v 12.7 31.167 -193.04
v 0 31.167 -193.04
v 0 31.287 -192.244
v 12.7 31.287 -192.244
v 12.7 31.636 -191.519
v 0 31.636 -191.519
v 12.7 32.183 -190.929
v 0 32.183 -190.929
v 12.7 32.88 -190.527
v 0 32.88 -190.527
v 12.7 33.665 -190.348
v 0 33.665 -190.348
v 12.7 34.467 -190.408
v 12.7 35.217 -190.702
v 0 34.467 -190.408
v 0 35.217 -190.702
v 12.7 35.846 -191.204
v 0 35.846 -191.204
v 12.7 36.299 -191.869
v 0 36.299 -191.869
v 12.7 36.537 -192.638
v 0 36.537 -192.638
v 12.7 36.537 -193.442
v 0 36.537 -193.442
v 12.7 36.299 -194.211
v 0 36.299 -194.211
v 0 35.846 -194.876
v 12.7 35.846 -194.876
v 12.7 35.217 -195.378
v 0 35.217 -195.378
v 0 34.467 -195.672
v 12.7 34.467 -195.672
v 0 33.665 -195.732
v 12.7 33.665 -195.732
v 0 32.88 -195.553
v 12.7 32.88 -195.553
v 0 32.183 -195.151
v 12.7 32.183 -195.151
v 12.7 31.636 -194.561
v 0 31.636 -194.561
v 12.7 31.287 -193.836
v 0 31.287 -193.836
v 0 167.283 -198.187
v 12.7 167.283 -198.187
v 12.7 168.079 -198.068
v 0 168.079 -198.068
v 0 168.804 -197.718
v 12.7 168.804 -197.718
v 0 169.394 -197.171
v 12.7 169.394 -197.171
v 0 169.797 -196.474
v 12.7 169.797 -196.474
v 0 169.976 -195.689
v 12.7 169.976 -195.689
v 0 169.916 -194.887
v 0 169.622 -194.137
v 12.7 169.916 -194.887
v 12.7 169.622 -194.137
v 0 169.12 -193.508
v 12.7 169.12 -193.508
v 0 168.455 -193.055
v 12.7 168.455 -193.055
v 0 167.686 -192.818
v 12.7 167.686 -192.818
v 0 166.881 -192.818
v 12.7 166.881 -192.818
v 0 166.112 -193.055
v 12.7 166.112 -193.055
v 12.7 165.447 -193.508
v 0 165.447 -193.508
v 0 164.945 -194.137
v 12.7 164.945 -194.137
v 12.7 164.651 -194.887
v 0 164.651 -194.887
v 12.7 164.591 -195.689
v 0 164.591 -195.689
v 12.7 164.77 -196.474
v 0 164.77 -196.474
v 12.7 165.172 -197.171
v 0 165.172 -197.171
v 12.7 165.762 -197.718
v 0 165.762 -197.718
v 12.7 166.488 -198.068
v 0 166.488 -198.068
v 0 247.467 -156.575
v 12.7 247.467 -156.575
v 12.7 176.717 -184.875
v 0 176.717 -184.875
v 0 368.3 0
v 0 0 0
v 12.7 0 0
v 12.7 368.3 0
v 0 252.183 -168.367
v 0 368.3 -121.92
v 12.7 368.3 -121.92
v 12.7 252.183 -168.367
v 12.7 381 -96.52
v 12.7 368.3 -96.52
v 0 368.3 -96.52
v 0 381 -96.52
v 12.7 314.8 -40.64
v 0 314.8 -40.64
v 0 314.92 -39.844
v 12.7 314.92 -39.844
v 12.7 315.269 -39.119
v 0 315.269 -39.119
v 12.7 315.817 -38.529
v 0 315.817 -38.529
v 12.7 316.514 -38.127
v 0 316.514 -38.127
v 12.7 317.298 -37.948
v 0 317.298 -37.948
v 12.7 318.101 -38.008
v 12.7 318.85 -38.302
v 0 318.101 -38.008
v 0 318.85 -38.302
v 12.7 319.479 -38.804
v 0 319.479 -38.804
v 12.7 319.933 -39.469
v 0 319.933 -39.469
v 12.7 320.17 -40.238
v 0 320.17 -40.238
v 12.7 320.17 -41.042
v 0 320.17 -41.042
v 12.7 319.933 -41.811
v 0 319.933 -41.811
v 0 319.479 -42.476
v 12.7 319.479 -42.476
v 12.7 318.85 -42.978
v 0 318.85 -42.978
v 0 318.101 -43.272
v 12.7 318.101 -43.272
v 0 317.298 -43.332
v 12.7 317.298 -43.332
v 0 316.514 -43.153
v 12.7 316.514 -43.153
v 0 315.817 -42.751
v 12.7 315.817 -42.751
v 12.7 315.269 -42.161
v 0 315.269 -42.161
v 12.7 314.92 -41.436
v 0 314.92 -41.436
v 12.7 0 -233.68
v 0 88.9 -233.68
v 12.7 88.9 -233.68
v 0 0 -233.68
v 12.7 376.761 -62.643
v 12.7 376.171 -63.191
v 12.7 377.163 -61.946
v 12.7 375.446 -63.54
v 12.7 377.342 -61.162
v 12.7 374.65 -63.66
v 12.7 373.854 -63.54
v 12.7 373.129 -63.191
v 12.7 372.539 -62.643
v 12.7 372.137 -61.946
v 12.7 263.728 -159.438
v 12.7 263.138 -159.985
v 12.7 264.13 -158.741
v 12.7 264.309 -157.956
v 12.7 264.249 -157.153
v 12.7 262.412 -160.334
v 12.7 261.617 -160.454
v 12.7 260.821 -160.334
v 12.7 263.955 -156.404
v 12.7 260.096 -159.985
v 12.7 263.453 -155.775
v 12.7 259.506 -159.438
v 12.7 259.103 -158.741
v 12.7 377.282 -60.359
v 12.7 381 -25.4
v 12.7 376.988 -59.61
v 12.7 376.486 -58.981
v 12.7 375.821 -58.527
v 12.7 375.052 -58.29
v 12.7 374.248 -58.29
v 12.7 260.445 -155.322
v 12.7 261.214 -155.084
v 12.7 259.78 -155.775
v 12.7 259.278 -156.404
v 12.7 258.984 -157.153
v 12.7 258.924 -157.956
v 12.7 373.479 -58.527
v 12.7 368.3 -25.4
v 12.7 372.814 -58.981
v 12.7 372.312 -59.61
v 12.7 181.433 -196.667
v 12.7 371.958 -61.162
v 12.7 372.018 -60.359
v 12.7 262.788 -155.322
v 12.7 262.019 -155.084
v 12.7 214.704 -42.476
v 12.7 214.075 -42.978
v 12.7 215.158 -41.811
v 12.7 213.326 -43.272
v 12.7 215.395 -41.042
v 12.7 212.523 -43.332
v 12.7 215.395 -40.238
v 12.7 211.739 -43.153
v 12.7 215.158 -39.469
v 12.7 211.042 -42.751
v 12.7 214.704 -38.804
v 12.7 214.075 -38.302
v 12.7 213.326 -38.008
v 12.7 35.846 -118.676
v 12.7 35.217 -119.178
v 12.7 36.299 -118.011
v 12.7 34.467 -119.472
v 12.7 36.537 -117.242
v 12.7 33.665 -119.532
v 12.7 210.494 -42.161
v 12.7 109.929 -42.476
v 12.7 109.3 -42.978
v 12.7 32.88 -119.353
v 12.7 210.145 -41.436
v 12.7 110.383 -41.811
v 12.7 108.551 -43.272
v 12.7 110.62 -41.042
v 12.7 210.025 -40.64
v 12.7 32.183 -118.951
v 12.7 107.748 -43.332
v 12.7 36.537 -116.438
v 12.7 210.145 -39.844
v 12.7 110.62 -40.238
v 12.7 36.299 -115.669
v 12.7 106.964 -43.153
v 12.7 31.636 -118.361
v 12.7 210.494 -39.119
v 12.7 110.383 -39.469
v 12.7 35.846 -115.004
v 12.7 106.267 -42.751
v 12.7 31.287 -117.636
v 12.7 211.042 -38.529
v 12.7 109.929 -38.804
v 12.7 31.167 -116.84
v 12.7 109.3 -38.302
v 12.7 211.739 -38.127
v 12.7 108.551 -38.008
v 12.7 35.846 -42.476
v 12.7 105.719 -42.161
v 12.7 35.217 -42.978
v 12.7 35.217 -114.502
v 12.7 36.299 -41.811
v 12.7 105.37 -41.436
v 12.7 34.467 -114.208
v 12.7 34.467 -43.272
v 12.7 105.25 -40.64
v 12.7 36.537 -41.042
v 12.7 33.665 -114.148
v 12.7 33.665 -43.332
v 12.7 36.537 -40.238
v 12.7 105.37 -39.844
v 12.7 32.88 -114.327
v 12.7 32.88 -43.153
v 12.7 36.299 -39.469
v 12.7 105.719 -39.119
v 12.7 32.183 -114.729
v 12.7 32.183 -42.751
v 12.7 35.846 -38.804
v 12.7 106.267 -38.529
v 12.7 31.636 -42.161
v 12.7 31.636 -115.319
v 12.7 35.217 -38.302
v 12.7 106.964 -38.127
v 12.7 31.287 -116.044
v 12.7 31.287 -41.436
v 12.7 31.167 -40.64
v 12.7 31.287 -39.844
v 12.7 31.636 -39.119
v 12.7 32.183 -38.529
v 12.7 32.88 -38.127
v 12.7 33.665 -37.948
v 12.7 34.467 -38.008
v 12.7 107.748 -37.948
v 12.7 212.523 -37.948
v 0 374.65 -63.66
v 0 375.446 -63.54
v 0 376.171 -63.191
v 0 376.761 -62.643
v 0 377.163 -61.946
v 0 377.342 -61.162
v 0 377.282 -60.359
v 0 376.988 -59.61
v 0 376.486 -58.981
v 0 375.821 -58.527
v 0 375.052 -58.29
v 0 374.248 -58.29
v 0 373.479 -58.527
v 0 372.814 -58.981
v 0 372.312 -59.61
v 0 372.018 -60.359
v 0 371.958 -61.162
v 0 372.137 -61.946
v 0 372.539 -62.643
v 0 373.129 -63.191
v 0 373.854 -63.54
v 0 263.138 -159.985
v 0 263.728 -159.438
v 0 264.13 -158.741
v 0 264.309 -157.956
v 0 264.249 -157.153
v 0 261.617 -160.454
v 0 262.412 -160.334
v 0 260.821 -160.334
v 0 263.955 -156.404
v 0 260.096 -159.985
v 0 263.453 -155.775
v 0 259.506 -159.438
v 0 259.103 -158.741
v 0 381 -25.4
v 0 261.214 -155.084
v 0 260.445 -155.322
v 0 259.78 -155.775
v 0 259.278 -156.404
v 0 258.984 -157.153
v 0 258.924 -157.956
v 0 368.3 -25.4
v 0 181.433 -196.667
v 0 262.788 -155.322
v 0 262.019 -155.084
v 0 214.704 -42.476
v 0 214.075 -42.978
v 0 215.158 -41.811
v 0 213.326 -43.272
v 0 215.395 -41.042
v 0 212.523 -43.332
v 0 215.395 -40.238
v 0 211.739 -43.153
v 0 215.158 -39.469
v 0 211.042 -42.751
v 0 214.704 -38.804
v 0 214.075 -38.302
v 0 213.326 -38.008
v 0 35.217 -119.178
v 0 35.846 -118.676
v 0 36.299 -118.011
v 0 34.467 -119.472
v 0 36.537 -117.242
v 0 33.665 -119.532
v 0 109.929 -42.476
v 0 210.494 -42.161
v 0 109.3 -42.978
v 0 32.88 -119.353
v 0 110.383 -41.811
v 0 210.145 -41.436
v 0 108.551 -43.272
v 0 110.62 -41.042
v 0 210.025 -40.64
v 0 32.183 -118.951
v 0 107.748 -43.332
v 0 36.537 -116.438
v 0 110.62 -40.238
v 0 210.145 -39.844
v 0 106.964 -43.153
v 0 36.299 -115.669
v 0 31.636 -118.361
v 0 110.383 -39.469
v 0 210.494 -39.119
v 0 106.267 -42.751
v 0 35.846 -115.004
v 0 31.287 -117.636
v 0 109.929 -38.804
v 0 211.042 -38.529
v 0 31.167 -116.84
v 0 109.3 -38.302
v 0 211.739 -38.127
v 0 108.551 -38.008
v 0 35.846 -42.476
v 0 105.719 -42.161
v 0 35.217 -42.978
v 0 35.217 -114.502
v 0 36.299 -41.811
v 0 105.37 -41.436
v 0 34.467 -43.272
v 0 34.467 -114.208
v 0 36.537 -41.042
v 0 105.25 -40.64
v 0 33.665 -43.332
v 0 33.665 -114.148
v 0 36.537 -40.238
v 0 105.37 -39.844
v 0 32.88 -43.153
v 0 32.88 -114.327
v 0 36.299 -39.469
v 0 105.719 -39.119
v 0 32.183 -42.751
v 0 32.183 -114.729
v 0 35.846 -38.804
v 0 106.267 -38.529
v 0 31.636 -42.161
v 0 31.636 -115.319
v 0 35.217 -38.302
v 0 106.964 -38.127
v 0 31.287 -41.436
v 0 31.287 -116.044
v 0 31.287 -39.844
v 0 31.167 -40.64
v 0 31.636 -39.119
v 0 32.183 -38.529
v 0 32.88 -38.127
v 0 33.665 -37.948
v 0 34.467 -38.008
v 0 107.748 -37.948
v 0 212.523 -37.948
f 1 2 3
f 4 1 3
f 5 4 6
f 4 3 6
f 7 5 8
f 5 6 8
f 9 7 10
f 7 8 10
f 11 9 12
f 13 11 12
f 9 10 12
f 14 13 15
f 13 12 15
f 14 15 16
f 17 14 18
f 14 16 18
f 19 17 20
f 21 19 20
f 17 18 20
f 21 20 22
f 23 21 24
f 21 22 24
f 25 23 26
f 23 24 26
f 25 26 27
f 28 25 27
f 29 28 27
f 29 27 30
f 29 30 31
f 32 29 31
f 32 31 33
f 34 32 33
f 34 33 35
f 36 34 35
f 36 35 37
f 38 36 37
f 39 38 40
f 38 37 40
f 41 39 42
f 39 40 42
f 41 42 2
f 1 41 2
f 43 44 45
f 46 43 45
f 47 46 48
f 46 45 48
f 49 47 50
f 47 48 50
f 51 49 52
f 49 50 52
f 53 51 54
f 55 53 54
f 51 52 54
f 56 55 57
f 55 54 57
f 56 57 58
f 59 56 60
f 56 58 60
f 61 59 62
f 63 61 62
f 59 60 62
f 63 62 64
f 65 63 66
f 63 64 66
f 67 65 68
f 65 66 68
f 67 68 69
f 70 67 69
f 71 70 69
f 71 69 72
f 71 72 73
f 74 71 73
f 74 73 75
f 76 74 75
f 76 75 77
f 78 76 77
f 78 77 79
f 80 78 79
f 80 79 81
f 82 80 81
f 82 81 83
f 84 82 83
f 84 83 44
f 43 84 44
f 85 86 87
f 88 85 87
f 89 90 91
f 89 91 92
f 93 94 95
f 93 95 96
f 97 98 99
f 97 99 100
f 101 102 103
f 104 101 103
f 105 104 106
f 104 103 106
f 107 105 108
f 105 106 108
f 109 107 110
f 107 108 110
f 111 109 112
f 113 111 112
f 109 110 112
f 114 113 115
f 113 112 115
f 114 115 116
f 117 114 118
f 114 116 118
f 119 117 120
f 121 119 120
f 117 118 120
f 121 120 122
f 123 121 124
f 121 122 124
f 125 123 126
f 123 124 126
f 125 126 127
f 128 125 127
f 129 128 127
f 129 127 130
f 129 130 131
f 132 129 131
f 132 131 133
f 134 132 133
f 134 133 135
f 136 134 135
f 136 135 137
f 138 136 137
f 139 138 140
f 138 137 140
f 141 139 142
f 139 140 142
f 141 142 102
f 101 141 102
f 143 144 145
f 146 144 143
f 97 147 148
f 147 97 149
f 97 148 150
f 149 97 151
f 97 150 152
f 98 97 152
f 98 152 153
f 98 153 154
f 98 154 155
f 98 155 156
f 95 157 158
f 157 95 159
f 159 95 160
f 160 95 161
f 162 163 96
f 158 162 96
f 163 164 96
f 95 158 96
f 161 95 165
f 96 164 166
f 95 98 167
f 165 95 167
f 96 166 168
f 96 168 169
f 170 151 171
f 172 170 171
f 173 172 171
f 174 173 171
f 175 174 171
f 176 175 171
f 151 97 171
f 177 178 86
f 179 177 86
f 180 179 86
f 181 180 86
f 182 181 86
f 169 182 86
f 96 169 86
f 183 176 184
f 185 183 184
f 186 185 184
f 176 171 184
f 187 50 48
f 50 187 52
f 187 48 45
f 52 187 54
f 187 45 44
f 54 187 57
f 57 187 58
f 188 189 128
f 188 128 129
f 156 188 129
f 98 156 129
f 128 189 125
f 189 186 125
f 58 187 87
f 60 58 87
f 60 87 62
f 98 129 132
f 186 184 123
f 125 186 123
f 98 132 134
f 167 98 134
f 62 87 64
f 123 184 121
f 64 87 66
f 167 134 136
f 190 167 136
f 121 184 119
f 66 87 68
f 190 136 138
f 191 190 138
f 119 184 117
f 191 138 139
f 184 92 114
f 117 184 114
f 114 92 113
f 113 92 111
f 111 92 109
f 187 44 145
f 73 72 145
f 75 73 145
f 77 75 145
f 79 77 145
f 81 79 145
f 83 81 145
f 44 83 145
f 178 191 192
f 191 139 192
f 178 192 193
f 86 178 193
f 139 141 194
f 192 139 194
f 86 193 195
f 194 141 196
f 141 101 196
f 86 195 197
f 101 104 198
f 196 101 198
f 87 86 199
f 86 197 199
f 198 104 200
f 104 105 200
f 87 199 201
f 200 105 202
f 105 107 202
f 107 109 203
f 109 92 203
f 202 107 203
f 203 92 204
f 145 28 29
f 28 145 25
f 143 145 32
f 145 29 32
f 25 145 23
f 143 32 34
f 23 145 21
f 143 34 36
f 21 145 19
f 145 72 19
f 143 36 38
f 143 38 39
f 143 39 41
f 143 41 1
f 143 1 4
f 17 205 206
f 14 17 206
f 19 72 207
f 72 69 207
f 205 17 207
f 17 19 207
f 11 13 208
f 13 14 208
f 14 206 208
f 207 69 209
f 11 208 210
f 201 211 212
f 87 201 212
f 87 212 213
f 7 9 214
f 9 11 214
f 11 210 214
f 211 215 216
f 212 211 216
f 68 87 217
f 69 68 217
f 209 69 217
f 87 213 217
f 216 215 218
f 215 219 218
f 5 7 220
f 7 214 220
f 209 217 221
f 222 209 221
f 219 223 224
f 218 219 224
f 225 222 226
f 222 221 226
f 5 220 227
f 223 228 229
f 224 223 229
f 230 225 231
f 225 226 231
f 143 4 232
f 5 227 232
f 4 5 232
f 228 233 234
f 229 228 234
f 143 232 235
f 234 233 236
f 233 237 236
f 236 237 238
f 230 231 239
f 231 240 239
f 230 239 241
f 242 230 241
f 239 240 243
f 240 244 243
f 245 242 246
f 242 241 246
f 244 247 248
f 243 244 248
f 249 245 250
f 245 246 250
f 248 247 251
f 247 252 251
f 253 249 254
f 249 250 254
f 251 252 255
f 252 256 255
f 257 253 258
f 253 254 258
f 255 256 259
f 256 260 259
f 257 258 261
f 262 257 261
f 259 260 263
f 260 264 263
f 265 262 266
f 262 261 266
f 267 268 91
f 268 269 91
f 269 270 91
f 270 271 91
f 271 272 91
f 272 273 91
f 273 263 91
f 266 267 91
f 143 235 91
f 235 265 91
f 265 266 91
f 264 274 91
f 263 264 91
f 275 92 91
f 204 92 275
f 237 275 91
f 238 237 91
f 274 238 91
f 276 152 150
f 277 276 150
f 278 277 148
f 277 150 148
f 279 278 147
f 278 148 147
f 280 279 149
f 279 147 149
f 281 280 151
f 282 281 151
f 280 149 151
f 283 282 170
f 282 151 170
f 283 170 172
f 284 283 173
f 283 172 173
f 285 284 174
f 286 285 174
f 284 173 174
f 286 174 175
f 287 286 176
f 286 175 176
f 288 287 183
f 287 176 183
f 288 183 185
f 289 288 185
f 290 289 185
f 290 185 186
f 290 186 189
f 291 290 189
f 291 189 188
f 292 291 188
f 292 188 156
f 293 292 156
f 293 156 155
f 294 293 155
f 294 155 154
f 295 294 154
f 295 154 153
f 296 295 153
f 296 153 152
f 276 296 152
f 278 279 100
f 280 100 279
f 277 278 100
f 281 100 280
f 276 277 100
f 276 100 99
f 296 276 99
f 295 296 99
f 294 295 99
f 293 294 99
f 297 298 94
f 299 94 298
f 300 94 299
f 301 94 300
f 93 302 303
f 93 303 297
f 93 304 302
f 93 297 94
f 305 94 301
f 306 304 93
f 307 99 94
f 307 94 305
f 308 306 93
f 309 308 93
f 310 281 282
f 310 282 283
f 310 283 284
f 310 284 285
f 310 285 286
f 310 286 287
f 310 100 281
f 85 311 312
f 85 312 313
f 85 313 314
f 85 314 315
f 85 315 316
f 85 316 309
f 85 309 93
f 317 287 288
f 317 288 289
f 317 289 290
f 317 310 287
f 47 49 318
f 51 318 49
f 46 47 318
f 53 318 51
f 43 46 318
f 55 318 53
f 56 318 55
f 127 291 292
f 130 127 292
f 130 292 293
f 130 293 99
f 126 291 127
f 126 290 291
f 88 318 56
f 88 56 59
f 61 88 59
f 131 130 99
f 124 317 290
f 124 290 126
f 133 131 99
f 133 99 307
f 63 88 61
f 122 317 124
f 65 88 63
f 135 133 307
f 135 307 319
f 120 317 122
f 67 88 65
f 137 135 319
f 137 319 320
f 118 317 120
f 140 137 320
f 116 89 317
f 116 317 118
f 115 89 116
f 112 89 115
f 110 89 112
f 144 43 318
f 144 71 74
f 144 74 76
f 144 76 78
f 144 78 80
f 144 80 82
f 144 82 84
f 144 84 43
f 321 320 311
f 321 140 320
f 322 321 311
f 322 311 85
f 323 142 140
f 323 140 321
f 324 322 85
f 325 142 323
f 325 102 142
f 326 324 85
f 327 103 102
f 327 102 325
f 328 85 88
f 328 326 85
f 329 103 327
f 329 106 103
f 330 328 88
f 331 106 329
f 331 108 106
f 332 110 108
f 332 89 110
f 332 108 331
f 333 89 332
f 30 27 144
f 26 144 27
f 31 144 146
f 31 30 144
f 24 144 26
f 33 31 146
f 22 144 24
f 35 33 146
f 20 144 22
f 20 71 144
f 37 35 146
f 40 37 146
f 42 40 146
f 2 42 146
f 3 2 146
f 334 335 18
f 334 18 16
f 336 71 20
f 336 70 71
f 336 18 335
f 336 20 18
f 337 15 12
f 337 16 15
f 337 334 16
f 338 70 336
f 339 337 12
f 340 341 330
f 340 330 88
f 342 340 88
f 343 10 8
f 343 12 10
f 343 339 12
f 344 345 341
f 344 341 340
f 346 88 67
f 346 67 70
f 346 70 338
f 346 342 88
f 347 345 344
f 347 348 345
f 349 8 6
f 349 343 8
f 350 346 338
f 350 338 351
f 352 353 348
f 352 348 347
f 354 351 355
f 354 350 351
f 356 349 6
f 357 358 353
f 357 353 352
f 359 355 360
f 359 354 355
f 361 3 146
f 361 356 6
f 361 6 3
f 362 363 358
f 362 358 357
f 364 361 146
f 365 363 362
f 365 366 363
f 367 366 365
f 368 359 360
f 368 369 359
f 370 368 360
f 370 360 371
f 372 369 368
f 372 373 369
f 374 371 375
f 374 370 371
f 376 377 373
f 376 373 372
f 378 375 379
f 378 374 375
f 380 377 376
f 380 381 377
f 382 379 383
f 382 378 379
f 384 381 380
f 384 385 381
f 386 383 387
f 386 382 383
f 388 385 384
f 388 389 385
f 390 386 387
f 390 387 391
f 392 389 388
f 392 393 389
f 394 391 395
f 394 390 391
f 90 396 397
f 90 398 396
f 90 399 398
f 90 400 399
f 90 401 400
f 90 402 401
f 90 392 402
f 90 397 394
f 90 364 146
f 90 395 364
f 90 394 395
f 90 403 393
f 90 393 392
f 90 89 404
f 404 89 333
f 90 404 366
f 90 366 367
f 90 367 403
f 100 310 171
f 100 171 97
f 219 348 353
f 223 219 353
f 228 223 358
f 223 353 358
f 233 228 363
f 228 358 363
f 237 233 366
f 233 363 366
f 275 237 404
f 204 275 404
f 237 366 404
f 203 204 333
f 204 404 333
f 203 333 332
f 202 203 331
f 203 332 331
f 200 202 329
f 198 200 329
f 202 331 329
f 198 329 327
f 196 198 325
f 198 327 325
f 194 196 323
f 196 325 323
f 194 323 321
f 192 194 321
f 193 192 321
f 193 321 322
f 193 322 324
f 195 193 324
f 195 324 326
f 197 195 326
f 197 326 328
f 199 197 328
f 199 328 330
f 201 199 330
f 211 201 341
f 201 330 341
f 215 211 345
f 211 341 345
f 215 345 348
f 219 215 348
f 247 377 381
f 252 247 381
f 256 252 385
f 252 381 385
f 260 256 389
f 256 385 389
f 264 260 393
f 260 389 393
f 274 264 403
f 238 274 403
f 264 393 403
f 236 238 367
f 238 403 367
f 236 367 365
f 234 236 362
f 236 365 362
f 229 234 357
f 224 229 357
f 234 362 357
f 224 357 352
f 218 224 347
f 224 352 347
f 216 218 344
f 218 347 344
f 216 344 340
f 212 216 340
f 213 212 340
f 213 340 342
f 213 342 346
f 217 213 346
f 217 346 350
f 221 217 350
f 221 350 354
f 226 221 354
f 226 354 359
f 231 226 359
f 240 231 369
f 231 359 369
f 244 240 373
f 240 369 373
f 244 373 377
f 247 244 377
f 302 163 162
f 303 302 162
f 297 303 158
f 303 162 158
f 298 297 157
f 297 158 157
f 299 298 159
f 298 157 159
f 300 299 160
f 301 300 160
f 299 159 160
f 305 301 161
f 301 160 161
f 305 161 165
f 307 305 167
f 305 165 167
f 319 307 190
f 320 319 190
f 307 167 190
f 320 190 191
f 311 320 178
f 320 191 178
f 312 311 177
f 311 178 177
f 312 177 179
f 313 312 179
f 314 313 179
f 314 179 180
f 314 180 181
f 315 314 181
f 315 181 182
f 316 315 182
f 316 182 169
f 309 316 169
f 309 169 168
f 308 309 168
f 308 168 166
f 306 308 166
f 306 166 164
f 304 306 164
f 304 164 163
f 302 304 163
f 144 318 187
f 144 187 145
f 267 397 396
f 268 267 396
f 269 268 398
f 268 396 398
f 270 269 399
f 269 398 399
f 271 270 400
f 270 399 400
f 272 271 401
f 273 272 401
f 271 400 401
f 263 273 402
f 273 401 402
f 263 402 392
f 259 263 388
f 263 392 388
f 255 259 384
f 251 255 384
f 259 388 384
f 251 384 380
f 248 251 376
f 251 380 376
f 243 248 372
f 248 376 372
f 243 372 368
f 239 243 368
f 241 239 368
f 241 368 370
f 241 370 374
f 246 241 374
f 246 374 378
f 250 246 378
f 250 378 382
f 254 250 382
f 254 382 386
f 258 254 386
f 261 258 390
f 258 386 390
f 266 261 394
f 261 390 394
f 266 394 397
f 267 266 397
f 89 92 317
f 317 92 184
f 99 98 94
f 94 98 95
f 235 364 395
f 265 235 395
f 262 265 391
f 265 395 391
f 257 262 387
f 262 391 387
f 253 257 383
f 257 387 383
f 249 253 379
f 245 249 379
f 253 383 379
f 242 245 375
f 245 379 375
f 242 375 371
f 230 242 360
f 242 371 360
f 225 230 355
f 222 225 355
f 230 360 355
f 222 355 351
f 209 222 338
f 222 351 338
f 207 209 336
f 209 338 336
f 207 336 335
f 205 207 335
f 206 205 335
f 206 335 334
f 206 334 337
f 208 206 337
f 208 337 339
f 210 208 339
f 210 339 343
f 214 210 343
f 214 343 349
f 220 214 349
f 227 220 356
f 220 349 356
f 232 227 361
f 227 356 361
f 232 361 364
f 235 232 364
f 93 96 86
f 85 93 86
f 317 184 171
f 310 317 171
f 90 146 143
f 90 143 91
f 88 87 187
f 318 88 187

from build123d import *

# Parameters (mm, degrees)
SKETCH1_R           = 2.7
BOSS_EXTRUDE1_DEPTH = 12.7
TOP_HOLE_REACH      = 14.7
SKETCH3_R           = 2.7
SKETCH3_W           = 25.4
SKETCH3_H           = 12.7
BACK_HOLES_REACH    = 14.7
SKETCH4_R           = 2.7


with BuildPart() as part:
    # Sketch1 → Boss-Extrude1 (new body)
    with BuildSketch(Plane(origin=(0, 0, 0), x_dir=(0, -1, 0), z_dir=(-1, 0, 0))):
        Polygon((-381, 0), (-381, -116.84), (-88.9, -233.68), (0, -233.68), (0, 0), align=None)
        with Locations((-212.725, -40.64)):
            Circle(SKETCH1_R, mode=Mode.SUBTRACT)
        with Locations((-317.5, -40.64)):
            Circle(SKETCH1_R, mode=Mode.SUBTRACT)
        with Locations((-107.95, -40.64)):
            Circle(SKETCH1_R, mode=Mode.SUBTRACT)
        with Locations((-33.866666667, -193.04)):
            Circle(SKETCH1_R, mode=Mode.SUBTRACT)
        with Locations((-33.866666667, -40.64)):
            Circle(SKETCH1_R, mode=Mode.SUBTRACT)
        with Locations((-33.866666667, -116.84)):
            Circle(SKETCH1_R, mode=Mode.SUBTRACT)
    extrude(amount=-BOSS_EXTRUDE1_DEPTH)

    # Sketch3 → top hole (cut, up to next)
    with BuildSketch(Plane(origin=(12.7, 0, 0), x_dir=(0, 0, -1), z_dir=(1, 0, 0)), mode=Mode.PRIVATE) as top_hole_sk1:
        with Locations((60.96, 374.65)):
            Circle(SKETCH3_R)
    top_hole_tool1 = extrude(top_hole_sk1.sketch, amount=-TOP_HOLE_REACH, mode=Mode.PRIVATE) & part.part
    add(top_hole_tool1.solids().sort_by_distance((12.7, 374.65, -60.96))[0], mode=Mode.SUBTRACT)
    # Sketch3 → top hole (cut, up to next)
    with BuildSketch(Plane(origin=(12.7, 0, 0), x_dir=(0, 0, -1), z_dir=(1, 0, 0)), mode=Mode.PRIVATE) as top_hole_sk2:
        with Locations((12.7, 374.65)):
            Rectangle(SKETCH3_W, SKETCH3_H)
    top_hole_tool2 = extrude(top_hole_sk2.sketch, amount=-TOP_HOLE_REACH, mode=Mode.PRIVATE) & part.part
    add(top_hole_tool2.solids().sort_by_distance((12.7, 374.65, -12.7))[0], mode=Mode.SUBTRACT)
    # Sketch3 → top hole (cut, up to next)
    with BuildSketch(Plane(origin=(12.7, 0, 0), x_dir=(0, 0, -1), z_dir=(1, 0, 0)), mode=Mode.PRIVATE) as top_hole_sk3:
        with Locations((109.22, 374.65)):
            Rectangle(SKETCH3_W, SKETCH3_H)
    top_hole_tool3 = extrude(top_hole_sk3.sketch, amount=-TOP_HOLE_REACH, mode=Mode.PRIVATE) & part.part
    add(top_hole_tool3.solids().sort_by_distance((12.7, 374.65, -109.22))[0], mode=Mode.SUBTRACT)

    # Sketch4 → back holes (cut, up to next)
    with BuildSketch(Plane(origin=(12.7, 0, 0), x_dir=(0, 0, -1), z_dir=(1, 0, 0)), mode=Mode.PRIVATE) as back_holes_sk1:
        with Locations((157.754188244, 261.616631128)):
            Circle(SKETCH4_R)
    back_holes_tool1 = extrude(back_holes_sk1.sketch, amount=-BACK_HOLES_REACH, mode=Mode.PRIVATE) & part.part
    add(back_holes_tool1.solids().sort_by_distance((12.7, 261.616631, -157.754188))[0], mode=Mode.SUBTRACT)
    # Sketch4 → back holes (cut, up to next)
    with BuildSketch(Plane(origin=(12.7, 0, 0), x_dir=(0, 0, -1), z_dir=(1, 0, 0)), mode=Mode.PRIVATE) as back_holes_sk2:
        with Locations((195.487480961, 167.283399334)):
            Circle(SKETCH4_R)
    back_holes_tool2 = extrude(back_holes_sk2.sketch, amount=-BACK_HOLES_REACH, mode=Mode.PRIVATE) & part.part
    add(back_holes_tool2.solids().sort_by_distance((12.7, 167.283399, -195.487481))[0], mode=Mode.SUBTRACT)
    # Sketch4 → back holes (cut, up to next)
    with BuildSketch(Plane(origin=(12.7, 0, 0), x_dir=(0, 0, -1), z_dir=(1, 0, 0)), mode=Mode.PRIVATE) as back_holes_sk3:
        Polygon((156.575022846, 247.466646359), (184.874992385, 176.716722513), (196.666646359, 181.433384103), (168.366676821, 252.183307948), align=None)
    back_holes_tool3 = extrude(back_holes_sk3.sketch, amount=-BACK_HOLES_REACH, mode=Mode.PRIVATE) & part.part
    add(back_holes_tool3.solids().sort_by_distance((12.7, 214.450015, -176.620835))[0], mode=Mode.SUBTRACT)


solid = part.part
